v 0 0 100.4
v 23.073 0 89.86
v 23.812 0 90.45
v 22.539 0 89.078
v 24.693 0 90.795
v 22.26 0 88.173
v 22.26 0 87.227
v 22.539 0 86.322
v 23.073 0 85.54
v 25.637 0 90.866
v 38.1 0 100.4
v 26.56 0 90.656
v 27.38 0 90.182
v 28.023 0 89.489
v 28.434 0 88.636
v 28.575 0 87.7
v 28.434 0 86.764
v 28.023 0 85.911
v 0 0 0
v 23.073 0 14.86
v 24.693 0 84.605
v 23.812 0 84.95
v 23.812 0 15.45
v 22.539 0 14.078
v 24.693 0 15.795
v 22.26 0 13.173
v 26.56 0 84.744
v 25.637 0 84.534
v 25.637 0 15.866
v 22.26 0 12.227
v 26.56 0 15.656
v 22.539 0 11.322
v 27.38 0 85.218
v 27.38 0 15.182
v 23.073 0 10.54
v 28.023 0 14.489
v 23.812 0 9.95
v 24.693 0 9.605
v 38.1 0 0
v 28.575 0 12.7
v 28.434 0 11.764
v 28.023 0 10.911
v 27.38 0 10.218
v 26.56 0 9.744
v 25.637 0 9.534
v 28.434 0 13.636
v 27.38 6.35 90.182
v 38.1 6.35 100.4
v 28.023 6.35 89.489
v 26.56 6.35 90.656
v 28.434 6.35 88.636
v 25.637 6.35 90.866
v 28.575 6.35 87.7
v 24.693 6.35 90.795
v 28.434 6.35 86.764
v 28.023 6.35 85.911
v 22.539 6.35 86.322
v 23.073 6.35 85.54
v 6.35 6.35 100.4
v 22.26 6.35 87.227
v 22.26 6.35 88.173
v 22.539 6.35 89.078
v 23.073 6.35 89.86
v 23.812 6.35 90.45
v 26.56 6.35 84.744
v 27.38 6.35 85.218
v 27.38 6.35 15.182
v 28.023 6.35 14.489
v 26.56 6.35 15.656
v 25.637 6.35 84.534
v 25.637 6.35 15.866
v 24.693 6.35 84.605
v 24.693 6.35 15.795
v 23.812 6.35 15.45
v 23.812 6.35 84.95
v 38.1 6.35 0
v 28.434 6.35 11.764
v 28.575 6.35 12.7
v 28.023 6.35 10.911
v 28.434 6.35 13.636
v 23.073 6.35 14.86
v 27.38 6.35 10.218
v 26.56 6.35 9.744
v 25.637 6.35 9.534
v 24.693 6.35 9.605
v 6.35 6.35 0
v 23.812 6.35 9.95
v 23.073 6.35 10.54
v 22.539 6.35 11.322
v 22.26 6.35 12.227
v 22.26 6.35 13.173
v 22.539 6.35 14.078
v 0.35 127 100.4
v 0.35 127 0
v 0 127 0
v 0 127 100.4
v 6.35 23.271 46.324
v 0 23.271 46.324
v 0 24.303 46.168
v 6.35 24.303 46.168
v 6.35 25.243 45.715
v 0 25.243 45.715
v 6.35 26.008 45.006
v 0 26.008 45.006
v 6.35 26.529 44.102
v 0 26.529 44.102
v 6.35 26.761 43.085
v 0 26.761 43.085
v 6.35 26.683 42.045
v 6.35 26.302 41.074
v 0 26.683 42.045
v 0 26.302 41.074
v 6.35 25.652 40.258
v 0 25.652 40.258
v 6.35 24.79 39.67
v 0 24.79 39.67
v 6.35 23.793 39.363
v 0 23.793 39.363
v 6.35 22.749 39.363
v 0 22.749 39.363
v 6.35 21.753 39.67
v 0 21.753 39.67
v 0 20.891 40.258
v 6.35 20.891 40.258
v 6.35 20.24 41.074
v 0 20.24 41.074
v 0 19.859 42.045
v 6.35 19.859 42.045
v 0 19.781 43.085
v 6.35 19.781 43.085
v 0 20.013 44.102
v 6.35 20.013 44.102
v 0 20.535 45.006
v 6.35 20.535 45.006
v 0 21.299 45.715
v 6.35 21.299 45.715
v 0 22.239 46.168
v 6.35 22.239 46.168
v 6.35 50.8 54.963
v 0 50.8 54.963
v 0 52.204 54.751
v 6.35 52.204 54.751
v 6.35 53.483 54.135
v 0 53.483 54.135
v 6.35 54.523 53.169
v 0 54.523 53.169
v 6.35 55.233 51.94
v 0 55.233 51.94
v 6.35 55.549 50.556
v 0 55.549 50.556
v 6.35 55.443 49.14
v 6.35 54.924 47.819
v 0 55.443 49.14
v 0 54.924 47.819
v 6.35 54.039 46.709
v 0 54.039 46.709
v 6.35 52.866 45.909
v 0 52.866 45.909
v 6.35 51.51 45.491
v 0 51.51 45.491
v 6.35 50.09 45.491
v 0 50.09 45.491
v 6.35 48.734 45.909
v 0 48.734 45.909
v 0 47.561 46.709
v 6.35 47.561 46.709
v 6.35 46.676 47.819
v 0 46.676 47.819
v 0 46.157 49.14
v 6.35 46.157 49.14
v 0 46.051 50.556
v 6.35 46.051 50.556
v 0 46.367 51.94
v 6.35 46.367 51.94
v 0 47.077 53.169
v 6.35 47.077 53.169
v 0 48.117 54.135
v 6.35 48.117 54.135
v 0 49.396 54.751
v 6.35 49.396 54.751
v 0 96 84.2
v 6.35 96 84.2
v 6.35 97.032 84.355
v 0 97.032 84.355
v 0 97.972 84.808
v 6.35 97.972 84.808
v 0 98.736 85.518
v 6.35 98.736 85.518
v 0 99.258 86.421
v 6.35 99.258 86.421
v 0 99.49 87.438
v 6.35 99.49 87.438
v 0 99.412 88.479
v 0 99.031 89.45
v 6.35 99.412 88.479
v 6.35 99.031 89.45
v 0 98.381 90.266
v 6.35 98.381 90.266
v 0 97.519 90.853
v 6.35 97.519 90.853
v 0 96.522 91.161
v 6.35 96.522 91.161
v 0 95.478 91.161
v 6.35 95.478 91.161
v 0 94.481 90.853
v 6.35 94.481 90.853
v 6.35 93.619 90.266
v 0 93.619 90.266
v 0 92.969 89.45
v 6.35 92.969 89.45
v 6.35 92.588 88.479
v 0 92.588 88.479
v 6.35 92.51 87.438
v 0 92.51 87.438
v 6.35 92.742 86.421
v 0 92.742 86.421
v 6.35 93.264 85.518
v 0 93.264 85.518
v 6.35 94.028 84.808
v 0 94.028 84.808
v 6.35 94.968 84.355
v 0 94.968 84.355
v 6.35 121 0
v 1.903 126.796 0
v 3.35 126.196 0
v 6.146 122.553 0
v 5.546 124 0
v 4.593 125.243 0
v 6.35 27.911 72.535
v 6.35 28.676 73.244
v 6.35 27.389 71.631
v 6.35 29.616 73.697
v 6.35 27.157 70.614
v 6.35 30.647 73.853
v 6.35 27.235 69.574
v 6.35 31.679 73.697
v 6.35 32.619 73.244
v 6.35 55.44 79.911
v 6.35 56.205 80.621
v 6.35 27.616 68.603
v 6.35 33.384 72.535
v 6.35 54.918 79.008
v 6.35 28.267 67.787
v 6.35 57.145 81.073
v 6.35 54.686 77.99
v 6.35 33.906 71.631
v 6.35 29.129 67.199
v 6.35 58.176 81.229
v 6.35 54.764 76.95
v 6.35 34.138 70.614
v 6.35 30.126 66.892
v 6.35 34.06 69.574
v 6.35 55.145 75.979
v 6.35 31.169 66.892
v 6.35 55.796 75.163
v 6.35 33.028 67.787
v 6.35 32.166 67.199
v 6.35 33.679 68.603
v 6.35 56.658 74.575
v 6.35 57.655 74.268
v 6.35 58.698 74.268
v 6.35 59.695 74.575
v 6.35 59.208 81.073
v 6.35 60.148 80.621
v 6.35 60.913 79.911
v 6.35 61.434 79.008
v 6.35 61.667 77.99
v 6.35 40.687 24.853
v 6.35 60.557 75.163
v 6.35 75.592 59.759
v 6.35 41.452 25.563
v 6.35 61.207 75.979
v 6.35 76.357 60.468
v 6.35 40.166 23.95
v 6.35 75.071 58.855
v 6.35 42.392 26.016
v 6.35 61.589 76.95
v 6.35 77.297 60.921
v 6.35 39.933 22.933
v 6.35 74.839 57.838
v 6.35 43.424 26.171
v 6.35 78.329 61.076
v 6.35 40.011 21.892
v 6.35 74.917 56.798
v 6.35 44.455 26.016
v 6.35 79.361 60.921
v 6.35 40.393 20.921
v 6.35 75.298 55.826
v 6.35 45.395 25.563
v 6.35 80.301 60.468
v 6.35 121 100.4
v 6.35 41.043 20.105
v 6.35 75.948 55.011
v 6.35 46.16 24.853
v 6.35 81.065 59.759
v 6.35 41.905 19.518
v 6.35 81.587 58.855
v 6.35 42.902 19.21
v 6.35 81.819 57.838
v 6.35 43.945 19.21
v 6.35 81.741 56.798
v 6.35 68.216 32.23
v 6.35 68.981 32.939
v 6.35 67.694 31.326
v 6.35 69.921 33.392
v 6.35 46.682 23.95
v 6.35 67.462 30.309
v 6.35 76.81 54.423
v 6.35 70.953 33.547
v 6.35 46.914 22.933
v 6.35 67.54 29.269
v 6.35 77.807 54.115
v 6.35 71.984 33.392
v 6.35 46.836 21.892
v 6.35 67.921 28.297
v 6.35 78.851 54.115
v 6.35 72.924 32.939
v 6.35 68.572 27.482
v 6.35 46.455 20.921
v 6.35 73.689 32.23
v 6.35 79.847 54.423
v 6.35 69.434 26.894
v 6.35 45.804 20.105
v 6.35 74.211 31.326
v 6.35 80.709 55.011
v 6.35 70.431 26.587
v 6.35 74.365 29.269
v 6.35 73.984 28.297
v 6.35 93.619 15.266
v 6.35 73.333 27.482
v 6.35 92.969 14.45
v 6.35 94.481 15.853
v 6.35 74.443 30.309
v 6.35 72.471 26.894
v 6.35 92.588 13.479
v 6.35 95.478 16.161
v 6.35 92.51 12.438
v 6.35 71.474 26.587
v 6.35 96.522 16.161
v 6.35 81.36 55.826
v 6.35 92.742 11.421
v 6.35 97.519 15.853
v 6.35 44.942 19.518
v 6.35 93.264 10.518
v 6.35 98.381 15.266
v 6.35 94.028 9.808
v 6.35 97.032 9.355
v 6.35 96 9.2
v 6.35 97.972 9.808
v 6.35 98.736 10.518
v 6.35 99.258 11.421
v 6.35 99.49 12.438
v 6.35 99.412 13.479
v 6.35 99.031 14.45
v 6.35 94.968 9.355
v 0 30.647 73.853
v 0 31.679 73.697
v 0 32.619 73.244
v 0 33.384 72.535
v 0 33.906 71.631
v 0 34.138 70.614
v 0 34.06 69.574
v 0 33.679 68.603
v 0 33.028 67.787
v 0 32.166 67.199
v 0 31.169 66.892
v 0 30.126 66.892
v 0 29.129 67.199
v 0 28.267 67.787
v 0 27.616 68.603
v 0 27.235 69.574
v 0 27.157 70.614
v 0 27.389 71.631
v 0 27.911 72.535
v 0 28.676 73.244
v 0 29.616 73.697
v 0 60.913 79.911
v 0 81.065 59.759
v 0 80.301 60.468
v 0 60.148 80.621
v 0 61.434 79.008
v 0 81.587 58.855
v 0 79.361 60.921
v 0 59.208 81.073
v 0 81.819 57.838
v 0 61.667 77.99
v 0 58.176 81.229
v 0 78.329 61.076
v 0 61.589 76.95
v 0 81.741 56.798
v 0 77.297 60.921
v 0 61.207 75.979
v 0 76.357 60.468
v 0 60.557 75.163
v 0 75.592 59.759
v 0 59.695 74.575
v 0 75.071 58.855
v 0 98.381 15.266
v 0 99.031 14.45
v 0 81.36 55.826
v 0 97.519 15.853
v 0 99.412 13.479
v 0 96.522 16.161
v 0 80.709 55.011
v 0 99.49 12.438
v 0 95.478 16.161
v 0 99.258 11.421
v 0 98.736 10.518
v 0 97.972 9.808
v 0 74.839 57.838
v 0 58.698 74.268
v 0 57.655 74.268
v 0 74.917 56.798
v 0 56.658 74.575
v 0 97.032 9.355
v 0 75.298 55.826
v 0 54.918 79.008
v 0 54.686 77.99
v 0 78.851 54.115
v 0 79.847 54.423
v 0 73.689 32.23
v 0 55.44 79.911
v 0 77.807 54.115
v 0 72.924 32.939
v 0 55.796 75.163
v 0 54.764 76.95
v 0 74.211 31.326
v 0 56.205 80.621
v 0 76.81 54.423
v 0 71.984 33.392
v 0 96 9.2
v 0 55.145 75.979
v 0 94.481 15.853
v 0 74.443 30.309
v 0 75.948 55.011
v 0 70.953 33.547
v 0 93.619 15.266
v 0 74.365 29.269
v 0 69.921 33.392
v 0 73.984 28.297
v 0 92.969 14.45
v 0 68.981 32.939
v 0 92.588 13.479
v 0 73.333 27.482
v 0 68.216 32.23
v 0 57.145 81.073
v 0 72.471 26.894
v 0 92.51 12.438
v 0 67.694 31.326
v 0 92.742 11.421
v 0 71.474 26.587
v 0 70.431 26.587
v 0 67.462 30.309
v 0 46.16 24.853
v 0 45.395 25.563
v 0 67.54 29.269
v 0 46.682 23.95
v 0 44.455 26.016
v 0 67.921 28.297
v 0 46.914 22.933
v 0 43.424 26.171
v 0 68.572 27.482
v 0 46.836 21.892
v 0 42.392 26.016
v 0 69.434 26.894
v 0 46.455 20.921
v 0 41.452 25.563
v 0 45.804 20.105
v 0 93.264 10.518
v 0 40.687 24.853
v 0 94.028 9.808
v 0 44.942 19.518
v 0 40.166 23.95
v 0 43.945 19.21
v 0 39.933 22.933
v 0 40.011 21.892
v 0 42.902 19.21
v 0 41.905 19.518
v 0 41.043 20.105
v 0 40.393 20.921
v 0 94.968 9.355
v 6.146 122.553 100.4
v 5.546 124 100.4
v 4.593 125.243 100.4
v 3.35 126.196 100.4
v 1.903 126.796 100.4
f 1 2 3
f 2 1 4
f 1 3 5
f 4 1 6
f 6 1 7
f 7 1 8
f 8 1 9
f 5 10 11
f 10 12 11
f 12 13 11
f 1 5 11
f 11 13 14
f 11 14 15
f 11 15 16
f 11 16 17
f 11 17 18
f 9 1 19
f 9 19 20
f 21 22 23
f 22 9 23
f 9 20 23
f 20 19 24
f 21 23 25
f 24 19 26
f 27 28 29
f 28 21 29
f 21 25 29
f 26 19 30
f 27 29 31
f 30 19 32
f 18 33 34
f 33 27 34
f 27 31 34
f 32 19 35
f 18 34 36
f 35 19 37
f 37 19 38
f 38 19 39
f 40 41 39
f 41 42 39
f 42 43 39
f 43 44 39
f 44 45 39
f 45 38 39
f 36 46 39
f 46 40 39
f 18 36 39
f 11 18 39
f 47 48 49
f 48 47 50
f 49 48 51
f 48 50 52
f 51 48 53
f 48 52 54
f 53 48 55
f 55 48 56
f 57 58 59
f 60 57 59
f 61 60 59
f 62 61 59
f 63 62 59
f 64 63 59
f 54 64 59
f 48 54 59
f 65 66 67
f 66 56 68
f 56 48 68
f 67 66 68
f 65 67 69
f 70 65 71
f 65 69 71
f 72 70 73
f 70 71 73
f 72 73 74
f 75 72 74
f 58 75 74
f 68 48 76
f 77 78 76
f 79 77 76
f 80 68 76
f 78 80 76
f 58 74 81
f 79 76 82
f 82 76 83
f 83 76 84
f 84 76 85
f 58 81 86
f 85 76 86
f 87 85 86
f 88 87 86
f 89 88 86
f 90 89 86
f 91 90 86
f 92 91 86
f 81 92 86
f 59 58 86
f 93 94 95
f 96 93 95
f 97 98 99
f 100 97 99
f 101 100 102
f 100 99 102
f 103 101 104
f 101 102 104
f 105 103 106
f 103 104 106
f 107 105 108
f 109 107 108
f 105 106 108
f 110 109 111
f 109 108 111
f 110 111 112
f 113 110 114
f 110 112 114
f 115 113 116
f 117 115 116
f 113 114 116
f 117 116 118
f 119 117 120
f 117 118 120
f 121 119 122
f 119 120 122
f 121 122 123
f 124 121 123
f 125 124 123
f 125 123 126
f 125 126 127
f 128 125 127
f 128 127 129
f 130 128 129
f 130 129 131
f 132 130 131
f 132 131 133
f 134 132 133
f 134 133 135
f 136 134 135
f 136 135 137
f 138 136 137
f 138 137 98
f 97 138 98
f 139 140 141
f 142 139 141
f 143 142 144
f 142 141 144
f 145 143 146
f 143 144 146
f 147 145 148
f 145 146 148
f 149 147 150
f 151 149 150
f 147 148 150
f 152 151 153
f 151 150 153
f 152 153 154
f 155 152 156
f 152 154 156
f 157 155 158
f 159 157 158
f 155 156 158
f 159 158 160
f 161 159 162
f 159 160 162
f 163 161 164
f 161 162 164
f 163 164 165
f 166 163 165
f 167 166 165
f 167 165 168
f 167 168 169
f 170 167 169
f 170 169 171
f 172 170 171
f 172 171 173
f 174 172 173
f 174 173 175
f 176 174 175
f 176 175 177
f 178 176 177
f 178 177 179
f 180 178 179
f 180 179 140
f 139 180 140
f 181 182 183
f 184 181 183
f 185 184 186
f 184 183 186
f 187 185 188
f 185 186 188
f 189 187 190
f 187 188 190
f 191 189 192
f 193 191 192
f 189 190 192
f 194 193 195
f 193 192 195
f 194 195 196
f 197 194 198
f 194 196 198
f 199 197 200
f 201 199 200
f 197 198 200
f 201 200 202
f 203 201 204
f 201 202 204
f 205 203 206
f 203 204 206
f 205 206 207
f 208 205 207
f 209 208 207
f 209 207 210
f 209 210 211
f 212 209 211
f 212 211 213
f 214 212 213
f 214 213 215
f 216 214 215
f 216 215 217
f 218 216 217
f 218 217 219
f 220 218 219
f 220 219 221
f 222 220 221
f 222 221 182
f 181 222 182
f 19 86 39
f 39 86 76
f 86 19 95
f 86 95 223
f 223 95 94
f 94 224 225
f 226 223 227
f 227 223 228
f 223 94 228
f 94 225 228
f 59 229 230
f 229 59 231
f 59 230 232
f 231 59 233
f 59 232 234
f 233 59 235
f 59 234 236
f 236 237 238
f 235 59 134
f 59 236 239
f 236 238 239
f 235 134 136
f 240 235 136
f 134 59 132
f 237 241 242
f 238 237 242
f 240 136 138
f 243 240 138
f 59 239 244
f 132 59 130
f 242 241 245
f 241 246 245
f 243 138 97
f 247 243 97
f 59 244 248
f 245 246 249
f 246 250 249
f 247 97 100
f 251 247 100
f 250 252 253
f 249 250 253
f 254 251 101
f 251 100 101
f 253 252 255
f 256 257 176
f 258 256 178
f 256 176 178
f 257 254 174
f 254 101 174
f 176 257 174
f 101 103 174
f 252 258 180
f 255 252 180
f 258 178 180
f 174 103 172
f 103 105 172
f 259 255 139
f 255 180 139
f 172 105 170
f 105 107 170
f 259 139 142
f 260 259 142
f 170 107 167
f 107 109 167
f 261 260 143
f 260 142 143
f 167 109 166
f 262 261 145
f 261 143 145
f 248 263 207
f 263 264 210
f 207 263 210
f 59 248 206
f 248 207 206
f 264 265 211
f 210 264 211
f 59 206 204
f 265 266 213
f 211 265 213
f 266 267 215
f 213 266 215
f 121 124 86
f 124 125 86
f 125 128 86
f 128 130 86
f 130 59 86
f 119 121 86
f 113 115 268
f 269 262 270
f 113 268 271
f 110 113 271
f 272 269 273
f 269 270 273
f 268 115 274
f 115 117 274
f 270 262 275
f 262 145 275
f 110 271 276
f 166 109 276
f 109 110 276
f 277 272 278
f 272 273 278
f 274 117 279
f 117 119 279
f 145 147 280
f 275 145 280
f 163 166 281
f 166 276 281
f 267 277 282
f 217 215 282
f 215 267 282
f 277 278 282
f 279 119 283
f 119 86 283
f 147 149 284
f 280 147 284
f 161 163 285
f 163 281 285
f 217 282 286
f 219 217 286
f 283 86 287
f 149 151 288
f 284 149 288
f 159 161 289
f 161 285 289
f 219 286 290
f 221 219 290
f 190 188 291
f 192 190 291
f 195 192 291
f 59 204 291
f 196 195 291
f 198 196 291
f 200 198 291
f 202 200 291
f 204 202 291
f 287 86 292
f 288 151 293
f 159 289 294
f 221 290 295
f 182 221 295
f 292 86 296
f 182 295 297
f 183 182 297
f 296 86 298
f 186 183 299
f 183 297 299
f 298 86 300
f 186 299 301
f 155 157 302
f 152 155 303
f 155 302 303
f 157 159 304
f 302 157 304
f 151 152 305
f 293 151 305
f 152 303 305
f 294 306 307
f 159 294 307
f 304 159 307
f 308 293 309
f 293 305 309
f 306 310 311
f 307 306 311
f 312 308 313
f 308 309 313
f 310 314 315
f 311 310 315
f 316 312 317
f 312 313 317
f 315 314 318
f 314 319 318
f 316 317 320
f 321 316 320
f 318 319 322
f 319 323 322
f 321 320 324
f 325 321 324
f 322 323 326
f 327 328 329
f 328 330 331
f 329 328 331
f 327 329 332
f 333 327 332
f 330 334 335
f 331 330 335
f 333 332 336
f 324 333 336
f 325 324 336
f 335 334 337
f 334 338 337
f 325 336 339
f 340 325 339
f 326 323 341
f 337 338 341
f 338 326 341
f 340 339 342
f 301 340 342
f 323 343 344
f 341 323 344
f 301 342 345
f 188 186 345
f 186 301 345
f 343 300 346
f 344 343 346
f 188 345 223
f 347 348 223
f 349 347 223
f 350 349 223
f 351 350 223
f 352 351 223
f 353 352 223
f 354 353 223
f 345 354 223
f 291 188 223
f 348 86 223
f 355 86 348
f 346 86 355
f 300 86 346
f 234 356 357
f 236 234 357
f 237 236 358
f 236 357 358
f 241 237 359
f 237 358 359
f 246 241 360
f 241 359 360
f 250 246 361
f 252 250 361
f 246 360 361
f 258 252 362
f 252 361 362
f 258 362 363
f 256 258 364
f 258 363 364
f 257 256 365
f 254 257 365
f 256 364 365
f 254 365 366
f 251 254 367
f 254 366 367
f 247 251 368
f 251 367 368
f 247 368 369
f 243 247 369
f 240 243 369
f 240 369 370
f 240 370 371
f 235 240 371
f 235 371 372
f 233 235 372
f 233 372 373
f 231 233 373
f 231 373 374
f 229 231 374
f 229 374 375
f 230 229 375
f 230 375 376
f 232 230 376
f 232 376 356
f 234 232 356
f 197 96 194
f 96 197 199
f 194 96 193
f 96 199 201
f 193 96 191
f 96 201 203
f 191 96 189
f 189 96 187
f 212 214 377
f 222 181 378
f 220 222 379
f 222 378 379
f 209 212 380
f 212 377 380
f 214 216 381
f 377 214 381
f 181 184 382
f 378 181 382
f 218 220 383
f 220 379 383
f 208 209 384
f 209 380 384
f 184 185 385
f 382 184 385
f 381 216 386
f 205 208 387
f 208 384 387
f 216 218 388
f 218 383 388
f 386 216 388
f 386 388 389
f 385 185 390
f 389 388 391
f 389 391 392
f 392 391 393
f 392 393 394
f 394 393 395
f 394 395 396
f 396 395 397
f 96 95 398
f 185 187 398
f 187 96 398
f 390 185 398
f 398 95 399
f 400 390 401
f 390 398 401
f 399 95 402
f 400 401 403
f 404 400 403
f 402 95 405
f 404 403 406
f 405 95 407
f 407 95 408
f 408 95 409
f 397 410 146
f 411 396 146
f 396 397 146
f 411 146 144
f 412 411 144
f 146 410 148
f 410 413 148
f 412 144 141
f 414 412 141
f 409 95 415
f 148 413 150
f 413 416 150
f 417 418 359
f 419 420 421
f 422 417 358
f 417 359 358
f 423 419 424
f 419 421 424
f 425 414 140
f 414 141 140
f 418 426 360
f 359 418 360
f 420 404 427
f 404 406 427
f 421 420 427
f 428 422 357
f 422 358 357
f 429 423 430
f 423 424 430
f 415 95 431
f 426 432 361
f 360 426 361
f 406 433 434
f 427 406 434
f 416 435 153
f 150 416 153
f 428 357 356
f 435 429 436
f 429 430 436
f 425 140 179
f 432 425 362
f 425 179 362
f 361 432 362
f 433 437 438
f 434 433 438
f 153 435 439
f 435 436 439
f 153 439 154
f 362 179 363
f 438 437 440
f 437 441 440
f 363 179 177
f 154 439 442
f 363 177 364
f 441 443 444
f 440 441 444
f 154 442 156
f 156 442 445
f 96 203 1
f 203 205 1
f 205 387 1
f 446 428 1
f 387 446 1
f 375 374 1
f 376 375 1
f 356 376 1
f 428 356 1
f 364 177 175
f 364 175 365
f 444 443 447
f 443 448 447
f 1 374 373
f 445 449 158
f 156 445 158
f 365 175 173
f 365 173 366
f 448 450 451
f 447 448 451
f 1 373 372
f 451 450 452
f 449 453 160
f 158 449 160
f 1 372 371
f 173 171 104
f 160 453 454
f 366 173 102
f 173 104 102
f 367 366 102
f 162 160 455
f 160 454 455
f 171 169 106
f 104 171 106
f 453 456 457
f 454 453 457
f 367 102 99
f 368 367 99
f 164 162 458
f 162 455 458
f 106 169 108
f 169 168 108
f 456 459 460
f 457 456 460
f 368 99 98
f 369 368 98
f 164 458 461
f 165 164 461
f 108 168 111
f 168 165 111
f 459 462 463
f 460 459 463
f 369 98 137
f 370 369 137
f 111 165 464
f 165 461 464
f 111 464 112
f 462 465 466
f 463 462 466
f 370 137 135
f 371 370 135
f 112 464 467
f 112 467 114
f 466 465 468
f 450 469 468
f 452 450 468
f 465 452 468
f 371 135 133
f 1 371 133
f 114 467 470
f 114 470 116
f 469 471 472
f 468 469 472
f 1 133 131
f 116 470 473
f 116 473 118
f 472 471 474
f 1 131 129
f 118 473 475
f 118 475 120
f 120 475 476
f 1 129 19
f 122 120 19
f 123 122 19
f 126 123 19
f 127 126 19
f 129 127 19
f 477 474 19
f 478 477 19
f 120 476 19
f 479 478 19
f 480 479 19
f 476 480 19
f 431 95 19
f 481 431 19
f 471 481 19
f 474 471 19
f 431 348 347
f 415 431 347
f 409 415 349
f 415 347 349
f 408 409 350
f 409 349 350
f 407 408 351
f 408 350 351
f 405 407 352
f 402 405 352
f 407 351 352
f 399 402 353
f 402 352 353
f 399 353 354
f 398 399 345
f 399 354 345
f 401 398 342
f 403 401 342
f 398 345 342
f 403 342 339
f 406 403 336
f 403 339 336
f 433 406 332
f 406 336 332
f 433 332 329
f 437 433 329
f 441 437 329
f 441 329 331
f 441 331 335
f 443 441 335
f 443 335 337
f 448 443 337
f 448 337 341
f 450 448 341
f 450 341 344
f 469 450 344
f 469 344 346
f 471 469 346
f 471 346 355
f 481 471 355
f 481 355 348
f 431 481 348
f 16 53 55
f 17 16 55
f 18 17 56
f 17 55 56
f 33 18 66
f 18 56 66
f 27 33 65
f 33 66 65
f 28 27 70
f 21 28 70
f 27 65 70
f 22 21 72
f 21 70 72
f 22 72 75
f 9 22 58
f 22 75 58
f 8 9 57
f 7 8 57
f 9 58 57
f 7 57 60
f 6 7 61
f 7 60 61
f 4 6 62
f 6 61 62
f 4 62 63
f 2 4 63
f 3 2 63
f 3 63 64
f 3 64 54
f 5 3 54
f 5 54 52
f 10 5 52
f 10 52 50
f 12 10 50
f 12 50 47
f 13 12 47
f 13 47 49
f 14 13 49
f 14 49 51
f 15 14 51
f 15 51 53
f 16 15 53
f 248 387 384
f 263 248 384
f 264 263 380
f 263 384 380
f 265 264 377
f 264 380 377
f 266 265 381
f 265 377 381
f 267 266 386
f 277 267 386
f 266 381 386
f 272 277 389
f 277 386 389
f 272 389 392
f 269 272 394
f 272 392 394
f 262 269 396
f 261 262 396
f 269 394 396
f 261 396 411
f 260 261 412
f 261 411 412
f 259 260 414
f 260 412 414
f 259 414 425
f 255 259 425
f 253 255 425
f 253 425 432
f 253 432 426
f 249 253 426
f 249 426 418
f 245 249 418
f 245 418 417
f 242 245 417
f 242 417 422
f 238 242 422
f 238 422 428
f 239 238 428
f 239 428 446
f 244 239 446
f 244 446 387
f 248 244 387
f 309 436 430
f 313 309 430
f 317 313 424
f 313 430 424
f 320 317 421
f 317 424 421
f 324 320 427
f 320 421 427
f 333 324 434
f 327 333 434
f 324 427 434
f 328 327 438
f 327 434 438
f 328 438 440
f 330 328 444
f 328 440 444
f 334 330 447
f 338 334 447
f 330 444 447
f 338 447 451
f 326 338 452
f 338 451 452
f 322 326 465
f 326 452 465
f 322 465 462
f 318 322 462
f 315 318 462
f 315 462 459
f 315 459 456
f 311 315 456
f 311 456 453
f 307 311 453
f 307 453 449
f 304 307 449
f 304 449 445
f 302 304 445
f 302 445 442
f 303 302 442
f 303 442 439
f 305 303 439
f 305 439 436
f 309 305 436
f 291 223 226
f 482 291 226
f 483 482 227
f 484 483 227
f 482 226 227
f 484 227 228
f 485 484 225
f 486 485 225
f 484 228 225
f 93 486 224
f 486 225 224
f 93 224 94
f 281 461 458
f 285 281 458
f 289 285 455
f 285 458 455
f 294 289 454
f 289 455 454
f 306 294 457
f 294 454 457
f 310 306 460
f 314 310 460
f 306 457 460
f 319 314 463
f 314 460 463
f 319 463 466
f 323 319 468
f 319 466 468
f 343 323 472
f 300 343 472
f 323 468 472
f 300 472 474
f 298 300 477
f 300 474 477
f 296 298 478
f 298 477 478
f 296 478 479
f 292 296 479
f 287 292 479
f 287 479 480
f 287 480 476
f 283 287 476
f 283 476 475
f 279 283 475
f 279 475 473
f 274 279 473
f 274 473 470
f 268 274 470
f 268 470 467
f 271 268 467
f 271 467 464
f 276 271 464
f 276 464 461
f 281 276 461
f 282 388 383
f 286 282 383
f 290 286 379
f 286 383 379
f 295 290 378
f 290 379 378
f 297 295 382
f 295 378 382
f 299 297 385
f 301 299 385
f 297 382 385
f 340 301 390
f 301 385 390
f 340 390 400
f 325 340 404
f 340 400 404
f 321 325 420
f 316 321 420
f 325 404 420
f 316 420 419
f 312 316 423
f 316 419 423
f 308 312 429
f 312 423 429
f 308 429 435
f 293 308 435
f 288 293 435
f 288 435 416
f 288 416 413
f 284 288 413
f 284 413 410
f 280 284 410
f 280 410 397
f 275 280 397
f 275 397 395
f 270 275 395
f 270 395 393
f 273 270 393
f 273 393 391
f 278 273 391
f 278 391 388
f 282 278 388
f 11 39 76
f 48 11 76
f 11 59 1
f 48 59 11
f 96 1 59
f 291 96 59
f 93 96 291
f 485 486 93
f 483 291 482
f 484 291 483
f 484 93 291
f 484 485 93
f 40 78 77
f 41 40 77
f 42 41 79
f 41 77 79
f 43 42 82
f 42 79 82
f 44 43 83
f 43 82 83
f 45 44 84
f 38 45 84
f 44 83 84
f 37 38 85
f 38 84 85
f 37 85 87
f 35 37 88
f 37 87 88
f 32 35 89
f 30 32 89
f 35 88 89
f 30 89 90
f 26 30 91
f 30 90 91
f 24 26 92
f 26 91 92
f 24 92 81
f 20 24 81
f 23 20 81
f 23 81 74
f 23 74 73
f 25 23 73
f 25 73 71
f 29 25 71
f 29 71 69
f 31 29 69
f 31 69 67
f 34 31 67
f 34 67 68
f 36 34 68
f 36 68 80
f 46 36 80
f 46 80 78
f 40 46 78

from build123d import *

# Parameters (mm, degrees)
BOSS_EXTRUDE1_DEPTH     = 100.4
SKETCH2_R               = 4.7625
SKETCH2_R_2             = 3.5
CUT_EXTRUDE1_DEPTH      = 1
CUT_EXTRUDE1_DEPTH_BACK = 39.1
SKETCH3_R               = 3.175
CUT_EXTRUDE2_DEPTH      = 7.35
SKETCH5_R               = 3.5
CUT_EXTRUDE4_DEPTH      = 10


with BuildPart() as part:
    # Sketch1 → Boss-Extrude1 (new body)
    with BuildSketch(Plane.XY):
        with BuildLine():
            Line((0, 6.35), (0, 0))
            Line((0, 0), (38.1, 0))
            Line((38.1, 0), (38.1, 0.35))
            Line((38.1, 0.35), (38.1, 6.35))
            Line((38.1, 6.35), (32.1, 6.35))
            Line((32.1, 6.35), (6.35, 6.35))
            Line((6.35, 6.35), (6.35, 37.75))
            Line((6.35, 37.75), (6.35, 121))
            ThreePointArc((6.35, 121), (4.592640687, 125.242640687), (0.35, 127))
            Line((0.35, 127), (0, 127))
            Line((0, 127), (0, 6.35))
        make_face()
    extrude(amount=BOSS_EXTRUDE1_DEPTH)

    # Sketch2 → Cut-Extrude1 (cut, two sides)
    with BuildSketch(Plane.ZY) as cut_extrude1_sk:
        with Locations((50.2, 50.8)):
            Circle(SKETCH2_R)
        with Locations((57.576342785, 78.328886049)):
            Circle(SKETCH2_R_2)
        with Locations((30.047456736, 70.952543264)):
            Circle(SKETCH2_R_2)
        with Locations((22.671113951, 43.423657215)):
            Circle(SKETCH2_R_2)
        with Locations((42.823657215, 23.271113951)):
            Circle(SKETCH2_R_2)
        with Locations((70.352543264, 30.647456736)):
            Circle(SKETCH2_R_2)
        with Locations((77.728886049, 58.176342785)):
            Circle(SKETCH2_R_2)
    extrude(amount=CUT_EXTRUDE1_DEPTH, mode=Mode.SUBTRACT)
    extrude(cut_extrude1_sk.sketch, amount=-CUT_EXTRUDE1_DEPTH_BACK, mode=Mode.SUBTRACT)

    # Sketch3 → Cut-Extrude2 (cut, through all)
    with BuildSketch(Plane(origin=(0, 6.35, 0), x_dir=(1, 0, 0), z_dir=(0, 1, 0))):
        with Locations((25.4, -12.7)):
            Circle(SKETCH3_R)
        with Locations((25.4, -87.7)):
            Circle(SKETCH3_R)
    extrude(amount=-CUT_EXTRUDE2_DEPTH, mode=Mode.SUBTRACT)

    # Sketch5 → Cut-Extrude4 (cut)
    with BuildSketch(Plane(origin=(6.35, 0, 0), x_dir=(0, 0, -1), z_dir=(1, 0, 0))):
        with Locations((-87.7, 96)):
            Circle(SKETCH5_R)
        with Locations((-12.7, 96)):
            Circle(SKETCH5_R)
    extrude(amount=-CUT_EXTRUDE4_DEPTH, mode=Mode.SUBTRACT)


solid = part.part
